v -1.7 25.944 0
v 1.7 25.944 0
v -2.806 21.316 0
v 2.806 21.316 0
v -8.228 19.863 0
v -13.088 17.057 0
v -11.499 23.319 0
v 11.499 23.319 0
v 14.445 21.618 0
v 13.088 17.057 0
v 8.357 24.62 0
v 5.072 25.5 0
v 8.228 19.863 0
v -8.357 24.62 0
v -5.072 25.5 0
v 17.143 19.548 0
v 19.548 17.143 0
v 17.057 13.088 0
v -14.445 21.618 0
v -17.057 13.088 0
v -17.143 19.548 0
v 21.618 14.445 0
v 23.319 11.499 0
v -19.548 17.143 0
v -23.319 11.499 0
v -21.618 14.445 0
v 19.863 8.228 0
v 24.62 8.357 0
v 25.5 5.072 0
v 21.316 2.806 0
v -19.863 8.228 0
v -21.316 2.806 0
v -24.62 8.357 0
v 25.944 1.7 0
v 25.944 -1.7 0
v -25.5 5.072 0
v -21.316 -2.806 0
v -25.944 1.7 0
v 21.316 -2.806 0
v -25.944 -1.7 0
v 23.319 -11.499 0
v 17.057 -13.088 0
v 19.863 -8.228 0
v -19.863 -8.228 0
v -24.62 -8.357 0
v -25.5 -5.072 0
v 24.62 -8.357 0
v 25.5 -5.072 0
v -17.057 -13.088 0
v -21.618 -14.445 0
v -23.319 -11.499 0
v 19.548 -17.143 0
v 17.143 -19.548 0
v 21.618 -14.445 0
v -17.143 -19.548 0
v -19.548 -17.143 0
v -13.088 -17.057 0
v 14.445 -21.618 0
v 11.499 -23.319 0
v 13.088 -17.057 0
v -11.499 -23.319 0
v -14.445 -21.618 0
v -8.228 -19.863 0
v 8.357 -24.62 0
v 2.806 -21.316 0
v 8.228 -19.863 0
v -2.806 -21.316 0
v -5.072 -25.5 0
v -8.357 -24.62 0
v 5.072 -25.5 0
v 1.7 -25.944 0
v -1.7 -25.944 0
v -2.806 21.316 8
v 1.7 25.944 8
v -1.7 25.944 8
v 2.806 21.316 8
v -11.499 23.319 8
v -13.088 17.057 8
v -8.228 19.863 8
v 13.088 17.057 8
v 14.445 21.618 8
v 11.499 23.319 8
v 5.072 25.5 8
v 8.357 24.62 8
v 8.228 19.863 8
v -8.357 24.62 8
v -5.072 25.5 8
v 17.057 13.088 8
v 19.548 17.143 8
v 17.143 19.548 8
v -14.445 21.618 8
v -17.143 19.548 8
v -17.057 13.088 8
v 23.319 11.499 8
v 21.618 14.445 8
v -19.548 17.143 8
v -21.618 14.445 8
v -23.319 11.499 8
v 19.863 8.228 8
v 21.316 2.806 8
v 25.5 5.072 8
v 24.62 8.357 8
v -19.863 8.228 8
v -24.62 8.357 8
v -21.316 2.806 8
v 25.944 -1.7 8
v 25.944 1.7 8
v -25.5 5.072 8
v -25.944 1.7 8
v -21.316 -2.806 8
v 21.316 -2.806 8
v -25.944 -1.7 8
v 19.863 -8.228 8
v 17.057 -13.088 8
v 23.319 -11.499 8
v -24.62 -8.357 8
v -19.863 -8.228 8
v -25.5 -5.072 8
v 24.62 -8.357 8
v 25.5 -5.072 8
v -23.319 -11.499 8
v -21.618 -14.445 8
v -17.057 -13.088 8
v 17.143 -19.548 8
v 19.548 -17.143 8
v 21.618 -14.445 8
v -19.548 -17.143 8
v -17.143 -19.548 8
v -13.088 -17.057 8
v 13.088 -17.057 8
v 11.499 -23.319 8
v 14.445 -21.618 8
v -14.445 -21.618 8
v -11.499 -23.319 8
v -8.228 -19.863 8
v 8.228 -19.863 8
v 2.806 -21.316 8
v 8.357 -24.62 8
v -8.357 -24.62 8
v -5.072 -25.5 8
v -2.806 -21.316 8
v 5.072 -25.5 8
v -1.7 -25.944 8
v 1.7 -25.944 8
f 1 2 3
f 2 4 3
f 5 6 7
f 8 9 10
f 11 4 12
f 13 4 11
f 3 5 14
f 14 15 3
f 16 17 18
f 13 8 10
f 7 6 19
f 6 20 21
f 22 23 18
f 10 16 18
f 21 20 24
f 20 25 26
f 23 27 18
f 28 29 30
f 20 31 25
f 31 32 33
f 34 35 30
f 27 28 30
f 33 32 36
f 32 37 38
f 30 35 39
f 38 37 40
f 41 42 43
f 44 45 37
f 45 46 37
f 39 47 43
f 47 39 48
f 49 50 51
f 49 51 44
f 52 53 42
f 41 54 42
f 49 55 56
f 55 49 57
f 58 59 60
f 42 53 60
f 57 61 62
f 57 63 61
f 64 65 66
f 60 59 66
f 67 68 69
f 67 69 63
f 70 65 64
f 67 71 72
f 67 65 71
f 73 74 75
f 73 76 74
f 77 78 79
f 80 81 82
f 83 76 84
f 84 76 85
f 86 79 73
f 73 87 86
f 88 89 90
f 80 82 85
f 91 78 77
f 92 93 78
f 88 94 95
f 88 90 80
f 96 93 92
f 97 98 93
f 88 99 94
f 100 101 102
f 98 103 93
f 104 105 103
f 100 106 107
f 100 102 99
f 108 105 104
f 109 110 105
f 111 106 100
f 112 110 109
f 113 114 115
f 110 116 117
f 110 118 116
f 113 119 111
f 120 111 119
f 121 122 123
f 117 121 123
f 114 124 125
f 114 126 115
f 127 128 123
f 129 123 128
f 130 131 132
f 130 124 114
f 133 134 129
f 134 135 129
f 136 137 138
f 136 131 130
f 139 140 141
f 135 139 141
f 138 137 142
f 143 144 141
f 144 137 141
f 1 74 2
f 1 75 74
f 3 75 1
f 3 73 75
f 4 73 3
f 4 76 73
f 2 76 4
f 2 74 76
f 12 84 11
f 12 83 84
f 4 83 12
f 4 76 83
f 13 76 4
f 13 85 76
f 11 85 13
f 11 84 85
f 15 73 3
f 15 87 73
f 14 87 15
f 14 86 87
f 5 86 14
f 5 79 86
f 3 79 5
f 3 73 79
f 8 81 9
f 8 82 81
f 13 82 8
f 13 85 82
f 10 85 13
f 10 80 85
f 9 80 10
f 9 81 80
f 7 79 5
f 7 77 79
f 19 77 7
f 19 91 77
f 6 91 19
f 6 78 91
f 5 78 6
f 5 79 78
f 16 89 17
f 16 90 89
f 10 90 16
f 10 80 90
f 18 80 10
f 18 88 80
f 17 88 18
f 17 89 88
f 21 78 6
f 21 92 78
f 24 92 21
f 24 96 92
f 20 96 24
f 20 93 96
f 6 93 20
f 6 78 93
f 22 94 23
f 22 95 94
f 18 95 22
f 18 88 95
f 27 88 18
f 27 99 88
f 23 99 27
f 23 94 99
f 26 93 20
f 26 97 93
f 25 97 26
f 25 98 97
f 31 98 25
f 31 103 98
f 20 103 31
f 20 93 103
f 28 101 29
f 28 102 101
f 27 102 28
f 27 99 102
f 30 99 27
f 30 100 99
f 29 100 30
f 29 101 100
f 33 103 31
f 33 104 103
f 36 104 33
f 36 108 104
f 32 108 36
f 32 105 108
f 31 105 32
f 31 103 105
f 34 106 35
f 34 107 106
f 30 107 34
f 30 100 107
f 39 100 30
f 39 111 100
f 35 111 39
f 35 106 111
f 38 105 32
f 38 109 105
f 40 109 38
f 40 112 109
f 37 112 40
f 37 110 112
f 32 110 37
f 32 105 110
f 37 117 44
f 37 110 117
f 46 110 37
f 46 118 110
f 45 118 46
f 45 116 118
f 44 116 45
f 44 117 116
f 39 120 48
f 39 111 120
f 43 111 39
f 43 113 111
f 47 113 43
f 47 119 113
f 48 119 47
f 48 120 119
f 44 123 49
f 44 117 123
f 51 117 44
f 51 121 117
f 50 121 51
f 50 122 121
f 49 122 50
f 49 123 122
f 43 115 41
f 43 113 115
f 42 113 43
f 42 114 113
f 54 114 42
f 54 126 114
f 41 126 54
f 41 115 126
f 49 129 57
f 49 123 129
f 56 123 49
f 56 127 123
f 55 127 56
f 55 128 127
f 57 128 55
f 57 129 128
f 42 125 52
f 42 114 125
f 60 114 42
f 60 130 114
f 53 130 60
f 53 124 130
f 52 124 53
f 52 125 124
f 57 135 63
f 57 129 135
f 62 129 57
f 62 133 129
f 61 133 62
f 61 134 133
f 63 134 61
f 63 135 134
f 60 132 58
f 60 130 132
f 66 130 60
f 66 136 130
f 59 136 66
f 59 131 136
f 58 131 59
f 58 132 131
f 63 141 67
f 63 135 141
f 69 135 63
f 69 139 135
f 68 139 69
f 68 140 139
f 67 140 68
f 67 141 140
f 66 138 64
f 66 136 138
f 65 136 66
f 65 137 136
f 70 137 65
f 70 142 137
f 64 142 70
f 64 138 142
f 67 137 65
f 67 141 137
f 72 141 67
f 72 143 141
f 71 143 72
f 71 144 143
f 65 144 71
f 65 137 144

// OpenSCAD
// ============================================================
// SPUR GEAR — CLEAN TEMPLATE (arc-based tooth, printable)
// ============================================================
// Naming conventions:
// - snake_case for variables and parameters
// - avoid OpenSCAD reserved words (e.g., DO NOT name a parameter "module")
// - degrees for trig (OpenSCAD sin/cos use degrees)
// - all lengths assumed millimeters
//
// UI metadata for your generator:
// param: teeth=24, modul=2, thickness=8, bore_diam=5, $fn_gear=128
// CALL:(teeth=24, modul=2, thickness=8, bore_diam=5);
gear(teeth=24, modul=2, thickness=8, bore_diam=5, $fn_gear=128);

// --------------------------- Public API ---------------------------
/**
 * gear()
 * @param teeth       : integer >= 6 (fewer can look degenerate with simple teeth)
 * @param modul       : ISO gear module (mm per tooth). NOT named "module" to avoid keyword clash.
 * @param thickness   : extrusion height (mm)
 * @param bore_diam   : center hole (mm)
 * @param $fn_gear    : circle resolution for smoother arcs (overrides $fn locally)
 *
 * Notes:
 * - This is a simple, printable tooth outline using arcs (not true involute). Good for demos.
 * - For realistic loads/meshing, switch to an involute version later.
 */
module gear(teeth=24, modul=2, thickness=8, bore_diam=5, $fn_gear=128)
{
    // ------------ Lightweight argument checks (avoid hard failures) ------------
    valid_teeth     = (teeth >= 6);
    valid_modul     = (modul > 0);
    valid_thickness = (thickness > 0);
    valid_bore      = (bore_diam >= 0);

    // You can flip these to "assert(...)" if you prefer hard stops:
    if (!valid_teeth)     echo("[WARN] teeth should be >= 6 for a clean outline.");
    if (!valid_modul)     echo("[WARN] modul must be > 0.");
    if (!valid_thickness) echo("[WARN] thickness must be > 0.");
    if (!valid_bore)      echo("[WARN] bore_diam must be >= 0.");

    // ------------ Derived geometry (ISO-ish defaults) ------------
    m = modul;
    z = teeth;

    pitch_radius     = 0.5 * m * z;       // r_p
    addendum_radius  = pitch_radius + m;  // r_a
    dedendum_factor  = 1.25;              // common approximation
    root_radius_raw  = pitch_radius - dedendum_factor * m;
    root_radius      = (root_radius_raw < 0.1) ? 0.1 : root_radius_raw; // avoid negatives

    // Tooth angular half-width at pitch circle (degrees).
    // This arc-based tooth centers a wedge around the tooth centerline.
    half_tooth_deg   = 180 / z;

    // local resolution for smooth circles
    gear_fn = $fn_gear;

    // ------------ Build 3D ------------
    // Use local $fn inside scope (OpenSCAD respects lexical $fn)
    // 'difference' to subtract the bore
    // linear_extrude is centered at z=0..thickness
    $fn = gear_fn;
    linear_extrude(height = thickness)
        difference() {
            gear_2d(z, pitch_radius, addendum_radius, root_radius, half_tooth_deg);
            if (bore_diam > 0)
                circle(d = bore_diam);
        }
}

// --------------------------- Internal: 2D outline ---------------------------
/**
 * gear_2d()
 * Builds a 2D gear via repeated single-tooth wedges around the origin.
 */
module gear_2d(teeth_count, pitch_radius, addendum_radius, root_radius, half_tooth_deg)
{
    tooth_step_deg = 360 / teeth_count;
    union() {
        for (i = [0 : teeth_count - 1])
            rotate(i * tooth_step_deg)
                single_tooth(addendum_radius, root_radius, half_tooth_deg);
    }
}

/**
 * single_tooth()
 * Simple wedge-like tooth made of four arc points.
 * NOTE: This is an approximation (not a true involute).
 */
module single_tooth(addendum_radius, root_radius, half_angle_deg)
{
    // Four key points: root−, tip−, tip+, root+
    pts = [
        [ root_radius * cos(-half_angle_deg),     root_radius * sin(-half_angle_deg)     ],
        [ addendum_radius * cos(-half_angle_deg/2), addendum_radius * sin(-half_angle_deg/2) ],
        [ addendum_radius * cos( half_angle_deg/2), addendum_radius * sin( half_angle_deg/2) ],
        [ root_radius * cos( half_angle_deg),     root_radius * sin( half_angle_deg)     ]
    ];
    polygon(points = pts);
}
